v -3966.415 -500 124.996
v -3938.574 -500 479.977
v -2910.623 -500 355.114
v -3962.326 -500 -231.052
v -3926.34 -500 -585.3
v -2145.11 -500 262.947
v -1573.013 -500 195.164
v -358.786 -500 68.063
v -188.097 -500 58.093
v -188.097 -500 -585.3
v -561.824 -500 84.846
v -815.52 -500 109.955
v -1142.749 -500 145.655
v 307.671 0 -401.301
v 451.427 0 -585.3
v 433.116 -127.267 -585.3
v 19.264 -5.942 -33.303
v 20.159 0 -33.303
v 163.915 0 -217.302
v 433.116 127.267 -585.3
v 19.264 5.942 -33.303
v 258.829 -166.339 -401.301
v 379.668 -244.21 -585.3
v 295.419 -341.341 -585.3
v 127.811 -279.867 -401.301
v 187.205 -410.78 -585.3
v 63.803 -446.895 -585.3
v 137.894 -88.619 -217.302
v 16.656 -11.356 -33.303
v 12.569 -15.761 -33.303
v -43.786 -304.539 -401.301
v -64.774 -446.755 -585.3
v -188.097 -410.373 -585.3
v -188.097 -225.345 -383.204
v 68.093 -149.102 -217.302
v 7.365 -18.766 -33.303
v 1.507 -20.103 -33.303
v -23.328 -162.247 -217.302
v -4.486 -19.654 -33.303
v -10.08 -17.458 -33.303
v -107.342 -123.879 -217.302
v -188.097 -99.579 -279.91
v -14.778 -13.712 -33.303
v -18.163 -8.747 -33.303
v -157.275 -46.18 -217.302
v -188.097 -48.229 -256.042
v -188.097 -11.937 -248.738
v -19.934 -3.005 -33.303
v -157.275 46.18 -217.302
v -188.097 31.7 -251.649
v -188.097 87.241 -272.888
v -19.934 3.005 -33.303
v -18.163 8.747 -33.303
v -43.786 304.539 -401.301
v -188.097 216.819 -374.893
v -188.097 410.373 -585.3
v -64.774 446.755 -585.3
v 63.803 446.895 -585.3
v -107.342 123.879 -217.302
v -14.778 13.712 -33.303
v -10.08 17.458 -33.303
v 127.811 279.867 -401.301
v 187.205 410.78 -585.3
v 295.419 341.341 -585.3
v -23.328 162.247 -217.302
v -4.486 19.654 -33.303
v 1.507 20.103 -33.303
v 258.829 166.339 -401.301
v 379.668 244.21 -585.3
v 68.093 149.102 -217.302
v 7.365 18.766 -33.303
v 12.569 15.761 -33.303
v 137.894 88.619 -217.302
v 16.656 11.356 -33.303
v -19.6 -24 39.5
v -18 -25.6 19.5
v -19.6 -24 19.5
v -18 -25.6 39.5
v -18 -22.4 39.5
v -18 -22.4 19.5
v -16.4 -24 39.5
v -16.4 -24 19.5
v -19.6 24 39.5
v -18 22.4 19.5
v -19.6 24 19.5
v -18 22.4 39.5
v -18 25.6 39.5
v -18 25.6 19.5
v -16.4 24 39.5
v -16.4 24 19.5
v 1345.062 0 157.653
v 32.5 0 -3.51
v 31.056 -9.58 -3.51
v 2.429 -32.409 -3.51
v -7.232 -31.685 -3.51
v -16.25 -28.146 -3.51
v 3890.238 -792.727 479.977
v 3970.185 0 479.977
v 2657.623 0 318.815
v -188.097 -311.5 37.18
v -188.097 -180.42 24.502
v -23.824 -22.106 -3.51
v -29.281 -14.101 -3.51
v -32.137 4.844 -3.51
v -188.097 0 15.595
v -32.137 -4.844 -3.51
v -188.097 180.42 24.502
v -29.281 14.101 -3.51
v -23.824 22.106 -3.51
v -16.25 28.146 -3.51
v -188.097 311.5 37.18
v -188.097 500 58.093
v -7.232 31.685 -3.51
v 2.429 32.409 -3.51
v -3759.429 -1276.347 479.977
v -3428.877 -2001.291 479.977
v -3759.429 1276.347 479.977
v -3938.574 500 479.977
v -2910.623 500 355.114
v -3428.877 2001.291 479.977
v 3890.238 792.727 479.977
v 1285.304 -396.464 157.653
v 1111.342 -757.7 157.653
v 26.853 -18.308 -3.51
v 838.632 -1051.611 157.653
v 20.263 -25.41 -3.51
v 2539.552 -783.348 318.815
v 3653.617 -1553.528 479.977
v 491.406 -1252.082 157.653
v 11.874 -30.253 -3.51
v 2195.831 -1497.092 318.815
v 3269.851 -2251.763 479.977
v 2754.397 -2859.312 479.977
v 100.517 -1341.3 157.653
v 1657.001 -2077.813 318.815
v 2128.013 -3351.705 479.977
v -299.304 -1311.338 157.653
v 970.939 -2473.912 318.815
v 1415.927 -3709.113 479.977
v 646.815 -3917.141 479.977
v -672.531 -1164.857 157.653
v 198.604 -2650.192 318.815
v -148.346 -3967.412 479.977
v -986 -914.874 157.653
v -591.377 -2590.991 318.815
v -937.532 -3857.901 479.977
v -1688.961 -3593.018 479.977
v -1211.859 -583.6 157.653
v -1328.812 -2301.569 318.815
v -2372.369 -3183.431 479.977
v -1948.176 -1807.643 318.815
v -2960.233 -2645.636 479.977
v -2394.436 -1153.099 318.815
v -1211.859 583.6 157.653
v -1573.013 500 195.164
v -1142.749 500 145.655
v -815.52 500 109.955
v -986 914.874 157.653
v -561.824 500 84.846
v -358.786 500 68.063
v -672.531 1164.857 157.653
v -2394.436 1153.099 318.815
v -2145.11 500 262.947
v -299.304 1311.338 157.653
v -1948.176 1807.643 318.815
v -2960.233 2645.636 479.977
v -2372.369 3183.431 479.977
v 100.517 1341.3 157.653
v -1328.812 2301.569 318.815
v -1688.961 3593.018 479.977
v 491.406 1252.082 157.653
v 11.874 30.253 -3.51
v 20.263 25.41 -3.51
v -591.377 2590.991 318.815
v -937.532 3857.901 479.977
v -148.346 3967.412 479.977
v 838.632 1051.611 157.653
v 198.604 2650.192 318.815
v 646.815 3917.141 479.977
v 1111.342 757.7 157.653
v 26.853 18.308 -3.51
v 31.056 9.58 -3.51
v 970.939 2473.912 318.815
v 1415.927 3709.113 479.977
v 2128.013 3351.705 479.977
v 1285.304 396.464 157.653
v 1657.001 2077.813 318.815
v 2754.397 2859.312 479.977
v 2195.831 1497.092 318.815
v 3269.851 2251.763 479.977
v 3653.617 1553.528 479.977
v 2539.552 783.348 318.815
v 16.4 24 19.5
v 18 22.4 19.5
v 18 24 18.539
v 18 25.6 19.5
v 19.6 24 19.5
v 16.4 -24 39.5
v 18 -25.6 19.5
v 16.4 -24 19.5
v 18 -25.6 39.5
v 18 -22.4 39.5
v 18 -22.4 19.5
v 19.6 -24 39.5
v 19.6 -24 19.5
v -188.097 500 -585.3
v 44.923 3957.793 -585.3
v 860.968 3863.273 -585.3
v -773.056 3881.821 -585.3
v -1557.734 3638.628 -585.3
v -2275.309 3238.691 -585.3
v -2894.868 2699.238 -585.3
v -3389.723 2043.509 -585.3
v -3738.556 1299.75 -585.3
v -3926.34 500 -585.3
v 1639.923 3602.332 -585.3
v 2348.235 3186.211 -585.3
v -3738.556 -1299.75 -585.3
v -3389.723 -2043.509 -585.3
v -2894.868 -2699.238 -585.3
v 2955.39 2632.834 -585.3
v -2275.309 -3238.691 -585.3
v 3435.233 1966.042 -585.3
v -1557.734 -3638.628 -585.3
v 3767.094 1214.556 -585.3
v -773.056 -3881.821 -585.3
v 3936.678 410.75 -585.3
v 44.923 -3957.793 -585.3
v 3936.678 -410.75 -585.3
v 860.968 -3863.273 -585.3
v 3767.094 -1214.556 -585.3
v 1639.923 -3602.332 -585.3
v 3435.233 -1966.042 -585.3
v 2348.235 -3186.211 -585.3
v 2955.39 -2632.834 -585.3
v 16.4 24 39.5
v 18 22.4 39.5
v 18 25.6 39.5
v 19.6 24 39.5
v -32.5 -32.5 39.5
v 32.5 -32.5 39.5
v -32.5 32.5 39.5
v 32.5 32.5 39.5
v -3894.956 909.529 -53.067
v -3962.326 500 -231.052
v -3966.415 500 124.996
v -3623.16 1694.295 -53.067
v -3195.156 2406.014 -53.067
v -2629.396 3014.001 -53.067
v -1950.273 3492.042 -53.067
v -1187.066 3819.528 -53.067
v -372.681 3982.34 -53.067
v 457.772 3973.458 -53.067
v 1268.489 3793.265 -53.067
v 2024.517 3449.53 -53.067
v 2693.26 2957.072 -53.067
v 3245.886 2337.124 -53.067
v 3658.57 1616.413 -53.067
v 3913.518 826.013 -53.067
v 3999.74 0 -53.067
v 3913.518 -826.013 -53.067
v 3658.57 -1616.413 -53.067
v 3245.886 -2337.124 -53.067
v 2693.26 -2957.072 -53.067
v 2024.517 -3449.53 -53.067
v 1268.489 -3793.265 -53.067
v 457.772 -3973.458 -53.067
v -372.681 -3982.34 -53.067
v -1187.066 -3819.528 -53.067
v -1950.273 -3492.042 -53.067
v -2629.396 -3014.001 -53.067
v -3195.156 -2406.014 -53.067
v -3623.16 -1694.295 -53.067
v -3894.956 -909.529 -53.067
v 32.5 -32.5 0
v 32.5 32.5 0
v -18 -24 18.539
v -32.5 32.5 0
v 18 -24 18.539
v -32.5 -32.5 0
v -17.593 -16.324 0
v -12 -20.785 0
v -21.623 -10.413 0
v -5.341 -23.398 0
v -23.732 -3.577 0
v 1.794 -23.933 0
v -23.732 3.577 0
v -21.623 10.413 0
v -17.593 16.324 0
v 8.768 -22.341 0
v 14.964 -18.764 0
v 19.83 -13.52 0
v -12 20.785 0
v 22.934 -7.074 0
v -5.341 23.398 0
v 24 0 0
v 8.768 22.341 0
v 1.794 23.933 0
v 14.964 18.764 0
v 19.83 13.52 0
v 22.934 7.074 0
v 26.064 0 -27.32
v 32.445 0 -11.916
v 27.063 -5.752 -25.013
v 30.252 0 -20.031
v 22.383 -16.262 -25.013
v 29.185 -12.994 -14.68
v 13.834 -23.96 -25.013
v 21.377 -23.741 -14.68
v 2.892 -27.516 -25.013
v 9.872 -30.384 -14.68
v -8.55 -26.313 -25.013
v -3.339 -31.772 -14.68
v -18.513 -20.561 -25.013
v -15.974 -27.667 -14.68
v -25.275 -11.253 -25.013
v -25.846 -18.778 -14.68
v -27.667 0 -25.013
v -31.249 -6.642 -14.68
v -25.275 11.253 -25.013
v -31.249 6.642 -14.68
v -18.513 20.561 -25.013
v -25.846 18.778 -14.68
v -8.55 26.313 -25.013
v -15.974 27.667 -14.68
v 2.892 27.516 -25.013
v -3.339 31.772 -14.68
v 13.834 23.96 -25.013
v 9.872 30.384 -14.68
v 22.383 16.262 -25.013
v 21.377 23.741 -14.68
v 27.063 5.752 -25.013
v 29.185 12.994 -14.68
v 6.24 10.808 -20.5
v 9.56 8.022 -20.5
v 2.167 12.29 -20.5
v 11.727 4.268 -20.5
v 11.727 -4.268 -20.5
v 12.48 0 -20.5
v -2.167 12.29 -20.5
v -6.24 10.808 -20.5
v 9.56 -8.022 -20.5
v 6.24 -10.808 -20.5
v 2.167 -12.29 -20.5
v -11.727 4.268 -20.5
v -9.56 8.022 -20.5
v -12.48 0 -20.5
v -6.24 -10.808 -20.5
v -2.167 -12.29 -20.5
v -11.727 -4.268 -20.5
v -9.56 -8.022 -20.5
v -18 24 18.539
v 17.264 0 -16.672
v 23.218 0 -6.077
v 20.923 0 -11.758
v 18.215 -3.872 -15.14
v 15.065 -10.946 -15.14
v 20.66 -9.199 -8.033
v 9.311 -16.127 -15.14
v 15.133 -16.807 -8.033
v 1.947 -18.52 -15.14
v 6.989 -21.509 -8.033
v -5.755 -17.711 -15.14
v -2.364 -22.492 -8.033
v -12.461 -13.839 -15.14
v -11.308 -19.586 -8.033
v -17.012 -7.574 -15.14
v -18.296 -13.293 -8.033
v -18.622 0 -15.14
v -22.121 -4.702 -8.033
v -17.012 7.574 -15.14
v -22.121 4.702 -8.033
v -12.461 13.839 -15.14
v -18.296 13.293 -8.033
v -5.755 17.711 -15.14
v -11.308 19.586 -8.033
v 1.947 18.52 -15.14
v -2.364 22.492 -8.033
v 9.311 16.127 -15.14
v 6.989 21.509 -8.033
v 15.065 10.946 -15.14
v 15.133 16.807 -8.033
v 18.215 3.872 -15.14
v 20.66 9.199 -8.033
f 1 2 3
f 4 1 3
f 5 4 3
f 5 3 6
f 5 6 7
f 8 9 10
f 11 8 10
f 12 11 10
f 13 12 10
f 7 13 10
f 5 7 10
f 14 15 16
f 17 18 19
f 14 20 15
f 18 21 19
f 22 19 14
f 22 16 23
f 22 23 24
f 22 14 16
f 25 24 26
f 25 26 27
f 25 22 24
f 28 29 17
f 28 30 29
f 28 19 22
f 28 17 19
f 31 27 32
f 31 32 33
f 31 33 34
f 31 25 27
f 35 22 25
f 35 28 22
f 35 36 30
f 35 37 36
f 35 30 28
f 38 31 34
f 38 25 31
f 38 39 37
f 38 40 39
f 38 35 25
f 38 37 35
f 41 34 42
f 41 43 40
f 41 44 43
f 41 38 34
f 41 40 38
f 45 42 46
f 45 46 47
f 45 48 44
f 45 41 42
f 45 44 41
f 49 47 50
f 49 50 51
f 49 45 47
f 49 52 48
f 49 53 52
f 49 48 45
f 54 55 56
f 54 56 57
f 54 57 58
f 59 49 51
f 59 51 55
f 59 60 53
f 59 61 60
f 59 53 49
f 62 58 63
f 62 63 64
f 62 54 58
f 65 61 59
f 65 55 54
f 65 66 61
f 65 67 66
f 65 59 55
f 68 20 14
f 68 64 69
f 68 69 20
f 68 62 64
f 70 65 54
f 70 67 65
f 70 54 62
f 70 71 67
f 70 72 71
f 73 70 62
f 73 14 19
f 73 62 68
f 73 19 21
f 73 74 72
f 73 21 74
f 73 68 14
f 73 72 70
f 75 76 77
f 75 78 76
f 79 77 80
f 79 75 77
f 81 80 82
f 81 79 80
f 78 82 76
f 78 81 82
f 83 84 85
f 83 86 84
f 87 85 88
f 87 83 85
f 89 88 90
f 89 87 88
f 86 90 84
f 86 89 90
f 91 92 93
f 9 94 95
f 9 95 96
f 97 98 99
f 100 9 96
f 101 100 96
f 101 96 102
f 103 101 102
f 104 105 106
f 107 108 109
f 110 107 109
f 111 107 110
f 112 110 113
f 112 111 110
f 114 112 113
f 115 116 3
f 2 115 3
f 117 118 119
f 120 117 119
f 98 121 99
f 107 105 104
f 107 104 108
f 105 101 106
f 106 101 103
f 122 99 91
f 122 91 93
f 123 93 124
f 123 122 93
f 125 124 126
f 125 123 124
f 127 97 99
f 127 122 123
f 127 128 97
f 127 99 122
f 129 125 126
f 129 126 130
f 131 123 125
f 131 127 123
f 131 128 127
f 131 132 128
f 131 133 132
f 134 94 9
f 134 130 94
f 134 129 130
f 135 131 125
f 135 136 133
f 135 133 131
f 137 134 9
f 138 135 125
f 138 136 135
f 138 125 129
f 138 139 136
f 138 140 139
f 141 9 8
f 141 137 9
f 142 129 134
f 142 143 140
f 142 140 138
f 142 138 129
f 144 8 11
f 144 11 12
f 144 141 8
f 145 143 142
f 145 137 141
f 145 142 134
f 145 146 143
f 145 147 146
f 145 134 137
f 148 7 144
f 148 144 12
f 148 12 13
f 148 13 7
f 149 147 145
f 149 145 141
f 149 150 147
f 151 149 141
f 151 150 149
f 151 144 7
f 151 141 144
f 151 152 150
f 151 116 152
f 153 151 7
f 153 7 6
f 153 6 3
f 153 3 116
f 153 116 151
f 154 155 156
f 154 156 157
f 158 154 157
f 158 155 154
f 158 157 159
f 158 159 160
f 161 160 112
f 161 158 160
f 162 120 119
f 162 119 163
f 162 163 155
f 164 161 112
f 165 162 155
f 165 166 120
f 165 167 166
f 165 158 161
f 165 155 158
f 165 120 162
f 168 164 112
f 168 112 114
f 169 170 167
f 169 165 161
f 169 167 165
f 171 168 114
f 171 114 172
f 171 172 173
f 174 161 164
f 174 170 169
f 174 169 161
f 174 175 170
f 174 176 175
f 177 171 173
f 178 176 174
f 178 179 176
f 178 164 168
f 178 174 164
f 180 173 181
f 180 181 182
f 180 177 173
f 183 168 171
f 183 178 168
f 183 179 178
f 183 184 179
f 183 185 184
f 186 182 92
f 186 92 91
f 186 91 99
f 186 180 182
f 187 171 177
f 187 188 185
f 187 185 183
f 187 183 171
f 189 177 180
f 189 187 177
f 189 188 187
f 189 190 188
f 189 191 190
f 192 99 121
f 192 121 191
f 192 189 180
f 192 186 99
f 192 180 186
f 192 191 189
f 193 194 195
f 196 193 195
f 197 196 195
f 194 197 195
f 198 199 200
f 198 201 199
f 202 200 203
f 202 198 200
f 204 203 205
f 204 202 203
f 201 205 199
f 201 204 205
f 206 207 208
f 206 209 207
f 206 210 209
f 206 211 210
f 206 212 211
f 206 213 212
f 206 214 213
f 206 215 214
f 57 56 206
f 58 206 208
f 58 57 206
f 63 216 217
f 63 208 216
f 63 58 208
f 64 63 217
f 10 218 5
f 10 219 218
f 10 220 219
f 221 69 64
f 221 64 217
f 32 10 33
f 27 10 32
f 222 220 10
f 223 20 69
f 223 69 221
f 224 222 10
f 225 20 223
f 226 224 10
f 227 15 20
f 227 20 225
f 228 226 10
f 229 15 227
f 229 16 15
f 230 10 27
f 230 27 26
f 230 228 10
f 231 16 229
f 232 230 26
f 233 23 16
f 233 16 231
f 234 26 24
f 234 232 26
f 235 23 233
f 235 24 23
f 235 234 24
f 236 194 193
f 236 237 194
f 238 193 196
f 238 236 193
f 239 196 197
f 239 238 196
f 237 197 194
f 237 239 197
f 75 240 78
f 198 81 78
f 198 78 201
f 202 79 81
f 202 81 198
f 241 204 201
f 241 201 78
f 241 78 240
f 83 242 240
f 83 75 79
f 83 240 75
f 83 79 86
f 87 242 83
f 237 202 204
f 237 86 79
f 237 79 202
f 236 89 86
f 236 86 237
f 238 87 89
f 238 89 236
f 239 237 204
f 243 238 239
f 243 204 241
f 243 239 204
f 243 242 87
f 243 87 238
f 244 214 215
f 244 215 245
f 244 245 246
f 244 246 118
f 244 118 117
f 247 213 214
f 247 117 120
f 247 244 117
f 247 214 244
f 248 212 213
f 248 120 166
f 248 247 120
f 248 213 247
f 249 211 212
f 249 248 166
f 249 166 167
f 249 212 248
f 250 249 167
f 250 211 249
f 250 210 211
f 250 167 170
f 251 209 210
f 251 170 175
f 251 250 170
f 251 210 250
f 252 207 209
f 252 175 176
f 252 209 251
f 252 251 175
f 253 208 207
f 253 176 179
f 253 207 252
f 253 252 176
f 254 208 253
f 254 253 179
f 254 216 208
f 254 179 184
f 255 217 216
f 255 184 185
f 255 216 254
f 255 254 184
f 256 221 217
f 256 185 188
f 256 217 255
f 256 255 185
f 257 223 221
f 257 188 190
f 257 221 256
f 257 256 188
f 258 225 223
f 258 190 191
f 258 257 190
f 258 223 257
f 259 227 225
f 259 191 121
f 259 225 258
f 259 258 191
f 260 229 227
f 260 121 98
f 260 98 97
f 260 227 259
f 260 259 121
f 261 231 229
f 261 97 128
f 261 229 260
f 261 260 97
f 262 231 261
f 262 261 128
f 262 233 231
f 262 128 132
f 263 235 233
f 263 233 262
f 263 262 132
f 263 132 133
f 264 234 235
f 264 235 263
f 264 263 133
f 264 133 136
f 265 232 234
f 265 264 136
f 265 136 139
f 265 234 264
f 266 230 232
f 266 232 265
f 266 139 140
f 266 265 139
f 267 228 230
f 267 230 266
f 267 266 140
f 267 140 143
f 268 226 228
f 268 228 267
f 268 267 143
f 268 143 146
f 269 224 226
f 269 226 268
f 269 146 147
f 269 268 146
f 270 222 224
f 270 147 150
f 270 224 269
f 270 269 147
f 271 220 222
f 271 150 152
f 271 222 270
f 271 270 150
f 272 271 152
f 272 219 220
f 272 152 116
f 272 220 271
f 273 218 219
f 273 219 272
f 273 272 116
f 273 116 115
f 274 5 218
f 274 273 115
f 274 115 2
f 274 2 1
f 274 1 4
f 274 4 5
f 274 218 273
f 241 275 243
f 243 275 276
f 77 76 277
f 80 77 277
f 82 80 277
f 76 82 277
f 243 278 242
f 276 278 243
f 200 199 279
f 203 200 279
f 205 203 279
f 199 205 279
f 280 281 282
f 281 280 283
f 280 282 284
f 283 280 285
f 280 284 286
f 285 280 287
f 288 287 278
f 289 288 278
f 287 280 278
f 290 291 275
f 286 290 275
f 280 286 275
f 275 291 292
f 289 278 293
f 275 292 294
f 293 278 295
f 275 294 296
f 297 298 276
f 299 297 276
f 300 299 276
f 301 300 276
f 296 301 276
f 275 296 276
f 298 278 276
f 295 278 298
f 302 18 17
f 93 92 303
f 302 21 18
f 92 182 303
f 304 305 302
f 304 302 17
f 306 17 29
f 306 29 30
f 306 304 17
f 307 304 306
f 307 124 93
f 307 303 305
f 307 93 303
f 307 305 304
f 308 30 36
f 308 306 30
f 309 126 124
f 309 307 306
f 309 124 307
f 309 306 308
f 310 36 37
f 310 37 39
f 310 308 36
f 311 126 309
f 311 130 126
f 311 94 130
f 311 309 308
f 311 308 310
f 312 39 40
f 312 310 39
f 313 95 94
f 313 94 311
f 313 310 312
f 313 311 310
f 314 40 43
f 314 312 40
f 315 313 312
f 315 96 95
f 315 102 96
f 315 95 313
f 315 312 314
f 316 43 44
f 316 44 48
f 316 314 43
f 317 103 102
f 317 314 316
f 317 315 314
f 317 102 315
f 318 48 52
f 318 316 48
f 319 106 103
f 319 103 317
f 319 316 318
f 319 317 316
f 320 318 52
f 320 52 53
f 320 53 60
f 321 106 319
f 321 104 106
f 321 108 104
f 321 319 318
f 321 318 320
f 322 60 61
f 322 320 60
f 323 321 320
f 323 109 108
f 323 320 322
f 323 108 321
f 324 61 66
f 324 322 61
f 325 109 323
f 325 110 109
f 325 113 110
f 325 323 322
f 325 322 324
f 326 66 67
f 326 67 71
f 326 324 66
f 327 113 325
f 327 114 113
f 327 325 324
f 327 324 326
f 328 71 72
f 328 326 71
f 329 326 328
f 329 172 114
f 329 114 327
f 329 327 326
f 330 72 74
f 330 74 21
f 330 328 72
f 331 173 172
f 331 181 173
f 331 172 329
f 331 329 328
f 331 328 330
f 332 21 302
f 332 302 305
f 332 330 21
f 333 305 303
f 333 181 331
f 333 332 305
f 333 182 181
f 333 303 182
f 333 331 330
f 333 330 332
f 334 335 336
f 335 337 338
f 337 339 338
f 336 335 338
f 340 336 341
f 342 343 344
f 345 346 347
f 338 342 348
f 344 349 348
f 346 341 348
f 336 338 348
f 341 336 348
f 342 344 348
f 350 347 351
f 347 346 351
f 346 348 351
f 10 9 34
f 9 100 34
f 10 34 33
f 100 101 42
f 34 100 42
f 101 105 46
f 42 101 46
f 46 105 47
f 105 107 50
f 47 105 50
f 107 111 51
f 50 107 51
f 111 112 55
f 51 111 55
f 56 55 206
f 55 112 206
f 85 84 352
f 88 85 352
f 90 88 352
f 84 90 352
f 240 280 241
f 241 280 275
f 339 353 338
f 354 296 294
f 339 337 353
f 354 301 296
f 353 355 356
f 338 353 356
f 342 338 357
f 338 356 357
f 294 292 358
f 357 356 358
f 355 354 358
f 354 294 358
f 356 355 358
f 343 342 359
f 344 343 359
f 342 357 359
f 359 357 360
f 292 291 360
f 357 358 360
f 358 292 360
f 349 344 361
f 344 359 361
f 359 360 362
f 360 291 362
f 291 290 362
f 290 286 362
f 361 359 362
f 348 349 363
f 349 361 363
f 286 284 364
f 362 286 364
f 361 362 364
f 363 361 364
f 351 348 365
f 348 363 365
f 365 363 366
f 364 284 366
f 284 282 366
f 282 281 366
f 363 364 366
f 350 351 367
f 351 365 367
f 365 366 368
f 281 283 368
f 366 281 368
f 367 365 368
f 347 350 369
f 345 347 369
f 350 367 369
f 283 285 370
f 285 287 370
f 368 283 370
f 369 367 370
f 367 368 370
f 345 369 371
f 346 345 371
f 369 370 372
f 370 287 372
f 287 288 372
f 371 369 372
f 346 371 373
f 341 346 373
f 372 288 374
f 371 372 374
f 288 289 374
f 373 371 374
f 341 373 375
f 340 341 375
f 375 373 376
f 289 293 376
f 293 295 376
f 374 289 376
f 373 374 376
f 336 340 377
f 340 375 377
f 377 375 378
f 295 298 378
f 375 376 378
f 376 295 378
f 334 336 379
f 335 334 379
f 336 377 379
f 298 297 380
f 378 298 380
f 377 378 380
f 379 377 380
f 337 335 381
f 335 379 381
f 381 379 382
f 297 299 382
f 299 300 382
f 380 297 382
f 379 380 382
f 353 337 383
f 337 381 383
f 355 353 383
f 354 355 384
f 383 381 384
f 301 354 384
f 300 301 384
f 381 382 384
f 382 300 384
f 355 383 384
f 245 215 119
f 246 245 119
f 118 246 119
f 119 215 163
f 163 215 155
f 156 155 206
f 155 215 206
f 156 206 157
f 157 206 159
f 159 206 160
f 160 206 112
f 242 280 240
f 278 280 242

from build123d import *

# Parameters (mm, degrees)
SCHIZZO1_W                    = 65
SCHIZZO1_H                    = 65
ESTRUSIONE_ESTRUSIONE1_DEPTH  = 39.5
TAGLIO_ESTRUSIONE6_DEPTH      = 5821.887808239
FORO_PER_VITE_M3_1_AT_2_COUNT = 2
FORO_PER_VITE_M3_1_AT_2_PITCH = 36
FORO_PER_VITE_M3_1_AT_3_COUNT = 2
FORO_PER_VITE_M3_1_AT_3_PITCH = 60
FORO_PER_VITE_M3_1_AT_4_COUNT = 2
FORO_PER_VITE_M3_1_AT_4_PITCH = 48


with BuildPart() as part:
    # Schizzo1 → Estrusione-Estrusione1 (new body)
    with BuildSketch(Plane.XY):
        Rectangle(SCHIZZO1_W, SCHIZZO1_H)
    extrude(amount=ESTRUSIONE_ESTRUSIONE1_DEPTH)

    # Schizzo2 → Rivoluzione1 (revolve)
    with BuildSketch(Plane(origin=(0, 0, 0), x_dir=(1, 0, 0), z_dir=(0, 1, 0))):
        with BuildLine():
            Line((0, 0), (0, 20.5))
            Line((0, 20.5), (12.479983974, 20.5))
            ThreePointArc((12.479983974, 20.5), (20.922710333, 11.757558943), (24, 0))
            Line((24, 0), (0, 0))
        make_face()
    revolve(axis=Axis((0, 0, 0), (0, 0, -1)))

    # Schizzo10 → Foro per Vite M3-1 (revolve, cut)
    with BuildSketch(Plane(origin=(18, 24, 39.5), x_dir=(0, -1, 0), z_dir=(1, 0, 0))):
        Polygon((0, 0), (0, 20.96137699), (1.6, 20), (1.6, 0), align=None)
    foro_per_vite_m3_1 = revolve(axis=Axis((18, 24, 45.85), (0, 0, -1)), mode=Mode.SUBTRACT)

    # Foro per Vite M3-1 at 2: Foro per Vite M3-1 ×2
    with Locations(*[(-i * FORO_PER_VITE_M3_1_AT_2_PITCH, 0, 0) for i in range(1, FORO_PER_VITE_M3_1_AT_2_COUNT)]):
        add(foro_per_vite_m3_1, mode=Mode.SUBTRACT)

    # Foro per Vite M3-1 at 3: Foro per Vite M3-1 ×2
    with Locations(*[Vector(-0.5999999999999999, -0.8, 0) * (i * FORO_PER_VITE_M3_1_AT_3_PITCH) for i in range(1, FORO_PER_VITE_M3_1_AT_3_COUNT)]):
        add(foro_per_vite_m3_1, mode=Mode.SUBTRACT)

    # Foro per Vite M3-1 at 4: Foro per Vite M3-1 ×2
    with Locations(*[(0, -i * FORO_PER_VITE_M3_1_AT_4_PITCH, 0) for i in range(1, FORO_PER_VITE_M3_1_AT_4_COUNT)]):
        add(foro_per_vite_m3_1, mode=Mode.SUBTRACT)


with BuildPart() as body_2:
    # Schizzo5 → Rivoluzione5 (revolve)
    with BuildSketch(Plane(origin=(0, 0, 0), x_dir=(1, 0, 0), z_dir=(0, 1, 0))):
        with BuildLine():
            Line((32.5, 3.509501771), (3970.184606565, -479.977373621))
            ThreePointArc((3970.184606565, -479.977373621), (3999.74044582, 53.06715998), (3958.048402938, 585.3))
            Line((3958.048402938, 585.3), (451.426834996, 585.3))
            Line((451.426834996, 585.3), (20.15926203, 33.302678747))
            ThreePointArc((20.15926203, 33.302678747), (30.251575463, 20.03061284), (32.5, 3.509501771))
        make_face()
    revolve(axis=Axis((0, 0, 992.5), (0, 0, -1)))

    # Schizzo7 → Taglio-Estrusione6 (cut, through all)
    with BuildSketch(Plane(origin=(-188.097275149, 0, 0), x_dir=(0, 0, -1), z_dir=(1, 0, 0))):
        Polygon((585.3, -500), (585.3, 500), (60.5, 500), (-139.5, 500), (-489.5, 500), (-489.5, -500), (-139.5, -500), (60.5, -500), align=None)
    extrude(amount=-TAGLIO_ESTRUSIONE6_DEPTH, mode=Mode.SUBTRACT)


solid = Compound([part.part, body_2.part])
